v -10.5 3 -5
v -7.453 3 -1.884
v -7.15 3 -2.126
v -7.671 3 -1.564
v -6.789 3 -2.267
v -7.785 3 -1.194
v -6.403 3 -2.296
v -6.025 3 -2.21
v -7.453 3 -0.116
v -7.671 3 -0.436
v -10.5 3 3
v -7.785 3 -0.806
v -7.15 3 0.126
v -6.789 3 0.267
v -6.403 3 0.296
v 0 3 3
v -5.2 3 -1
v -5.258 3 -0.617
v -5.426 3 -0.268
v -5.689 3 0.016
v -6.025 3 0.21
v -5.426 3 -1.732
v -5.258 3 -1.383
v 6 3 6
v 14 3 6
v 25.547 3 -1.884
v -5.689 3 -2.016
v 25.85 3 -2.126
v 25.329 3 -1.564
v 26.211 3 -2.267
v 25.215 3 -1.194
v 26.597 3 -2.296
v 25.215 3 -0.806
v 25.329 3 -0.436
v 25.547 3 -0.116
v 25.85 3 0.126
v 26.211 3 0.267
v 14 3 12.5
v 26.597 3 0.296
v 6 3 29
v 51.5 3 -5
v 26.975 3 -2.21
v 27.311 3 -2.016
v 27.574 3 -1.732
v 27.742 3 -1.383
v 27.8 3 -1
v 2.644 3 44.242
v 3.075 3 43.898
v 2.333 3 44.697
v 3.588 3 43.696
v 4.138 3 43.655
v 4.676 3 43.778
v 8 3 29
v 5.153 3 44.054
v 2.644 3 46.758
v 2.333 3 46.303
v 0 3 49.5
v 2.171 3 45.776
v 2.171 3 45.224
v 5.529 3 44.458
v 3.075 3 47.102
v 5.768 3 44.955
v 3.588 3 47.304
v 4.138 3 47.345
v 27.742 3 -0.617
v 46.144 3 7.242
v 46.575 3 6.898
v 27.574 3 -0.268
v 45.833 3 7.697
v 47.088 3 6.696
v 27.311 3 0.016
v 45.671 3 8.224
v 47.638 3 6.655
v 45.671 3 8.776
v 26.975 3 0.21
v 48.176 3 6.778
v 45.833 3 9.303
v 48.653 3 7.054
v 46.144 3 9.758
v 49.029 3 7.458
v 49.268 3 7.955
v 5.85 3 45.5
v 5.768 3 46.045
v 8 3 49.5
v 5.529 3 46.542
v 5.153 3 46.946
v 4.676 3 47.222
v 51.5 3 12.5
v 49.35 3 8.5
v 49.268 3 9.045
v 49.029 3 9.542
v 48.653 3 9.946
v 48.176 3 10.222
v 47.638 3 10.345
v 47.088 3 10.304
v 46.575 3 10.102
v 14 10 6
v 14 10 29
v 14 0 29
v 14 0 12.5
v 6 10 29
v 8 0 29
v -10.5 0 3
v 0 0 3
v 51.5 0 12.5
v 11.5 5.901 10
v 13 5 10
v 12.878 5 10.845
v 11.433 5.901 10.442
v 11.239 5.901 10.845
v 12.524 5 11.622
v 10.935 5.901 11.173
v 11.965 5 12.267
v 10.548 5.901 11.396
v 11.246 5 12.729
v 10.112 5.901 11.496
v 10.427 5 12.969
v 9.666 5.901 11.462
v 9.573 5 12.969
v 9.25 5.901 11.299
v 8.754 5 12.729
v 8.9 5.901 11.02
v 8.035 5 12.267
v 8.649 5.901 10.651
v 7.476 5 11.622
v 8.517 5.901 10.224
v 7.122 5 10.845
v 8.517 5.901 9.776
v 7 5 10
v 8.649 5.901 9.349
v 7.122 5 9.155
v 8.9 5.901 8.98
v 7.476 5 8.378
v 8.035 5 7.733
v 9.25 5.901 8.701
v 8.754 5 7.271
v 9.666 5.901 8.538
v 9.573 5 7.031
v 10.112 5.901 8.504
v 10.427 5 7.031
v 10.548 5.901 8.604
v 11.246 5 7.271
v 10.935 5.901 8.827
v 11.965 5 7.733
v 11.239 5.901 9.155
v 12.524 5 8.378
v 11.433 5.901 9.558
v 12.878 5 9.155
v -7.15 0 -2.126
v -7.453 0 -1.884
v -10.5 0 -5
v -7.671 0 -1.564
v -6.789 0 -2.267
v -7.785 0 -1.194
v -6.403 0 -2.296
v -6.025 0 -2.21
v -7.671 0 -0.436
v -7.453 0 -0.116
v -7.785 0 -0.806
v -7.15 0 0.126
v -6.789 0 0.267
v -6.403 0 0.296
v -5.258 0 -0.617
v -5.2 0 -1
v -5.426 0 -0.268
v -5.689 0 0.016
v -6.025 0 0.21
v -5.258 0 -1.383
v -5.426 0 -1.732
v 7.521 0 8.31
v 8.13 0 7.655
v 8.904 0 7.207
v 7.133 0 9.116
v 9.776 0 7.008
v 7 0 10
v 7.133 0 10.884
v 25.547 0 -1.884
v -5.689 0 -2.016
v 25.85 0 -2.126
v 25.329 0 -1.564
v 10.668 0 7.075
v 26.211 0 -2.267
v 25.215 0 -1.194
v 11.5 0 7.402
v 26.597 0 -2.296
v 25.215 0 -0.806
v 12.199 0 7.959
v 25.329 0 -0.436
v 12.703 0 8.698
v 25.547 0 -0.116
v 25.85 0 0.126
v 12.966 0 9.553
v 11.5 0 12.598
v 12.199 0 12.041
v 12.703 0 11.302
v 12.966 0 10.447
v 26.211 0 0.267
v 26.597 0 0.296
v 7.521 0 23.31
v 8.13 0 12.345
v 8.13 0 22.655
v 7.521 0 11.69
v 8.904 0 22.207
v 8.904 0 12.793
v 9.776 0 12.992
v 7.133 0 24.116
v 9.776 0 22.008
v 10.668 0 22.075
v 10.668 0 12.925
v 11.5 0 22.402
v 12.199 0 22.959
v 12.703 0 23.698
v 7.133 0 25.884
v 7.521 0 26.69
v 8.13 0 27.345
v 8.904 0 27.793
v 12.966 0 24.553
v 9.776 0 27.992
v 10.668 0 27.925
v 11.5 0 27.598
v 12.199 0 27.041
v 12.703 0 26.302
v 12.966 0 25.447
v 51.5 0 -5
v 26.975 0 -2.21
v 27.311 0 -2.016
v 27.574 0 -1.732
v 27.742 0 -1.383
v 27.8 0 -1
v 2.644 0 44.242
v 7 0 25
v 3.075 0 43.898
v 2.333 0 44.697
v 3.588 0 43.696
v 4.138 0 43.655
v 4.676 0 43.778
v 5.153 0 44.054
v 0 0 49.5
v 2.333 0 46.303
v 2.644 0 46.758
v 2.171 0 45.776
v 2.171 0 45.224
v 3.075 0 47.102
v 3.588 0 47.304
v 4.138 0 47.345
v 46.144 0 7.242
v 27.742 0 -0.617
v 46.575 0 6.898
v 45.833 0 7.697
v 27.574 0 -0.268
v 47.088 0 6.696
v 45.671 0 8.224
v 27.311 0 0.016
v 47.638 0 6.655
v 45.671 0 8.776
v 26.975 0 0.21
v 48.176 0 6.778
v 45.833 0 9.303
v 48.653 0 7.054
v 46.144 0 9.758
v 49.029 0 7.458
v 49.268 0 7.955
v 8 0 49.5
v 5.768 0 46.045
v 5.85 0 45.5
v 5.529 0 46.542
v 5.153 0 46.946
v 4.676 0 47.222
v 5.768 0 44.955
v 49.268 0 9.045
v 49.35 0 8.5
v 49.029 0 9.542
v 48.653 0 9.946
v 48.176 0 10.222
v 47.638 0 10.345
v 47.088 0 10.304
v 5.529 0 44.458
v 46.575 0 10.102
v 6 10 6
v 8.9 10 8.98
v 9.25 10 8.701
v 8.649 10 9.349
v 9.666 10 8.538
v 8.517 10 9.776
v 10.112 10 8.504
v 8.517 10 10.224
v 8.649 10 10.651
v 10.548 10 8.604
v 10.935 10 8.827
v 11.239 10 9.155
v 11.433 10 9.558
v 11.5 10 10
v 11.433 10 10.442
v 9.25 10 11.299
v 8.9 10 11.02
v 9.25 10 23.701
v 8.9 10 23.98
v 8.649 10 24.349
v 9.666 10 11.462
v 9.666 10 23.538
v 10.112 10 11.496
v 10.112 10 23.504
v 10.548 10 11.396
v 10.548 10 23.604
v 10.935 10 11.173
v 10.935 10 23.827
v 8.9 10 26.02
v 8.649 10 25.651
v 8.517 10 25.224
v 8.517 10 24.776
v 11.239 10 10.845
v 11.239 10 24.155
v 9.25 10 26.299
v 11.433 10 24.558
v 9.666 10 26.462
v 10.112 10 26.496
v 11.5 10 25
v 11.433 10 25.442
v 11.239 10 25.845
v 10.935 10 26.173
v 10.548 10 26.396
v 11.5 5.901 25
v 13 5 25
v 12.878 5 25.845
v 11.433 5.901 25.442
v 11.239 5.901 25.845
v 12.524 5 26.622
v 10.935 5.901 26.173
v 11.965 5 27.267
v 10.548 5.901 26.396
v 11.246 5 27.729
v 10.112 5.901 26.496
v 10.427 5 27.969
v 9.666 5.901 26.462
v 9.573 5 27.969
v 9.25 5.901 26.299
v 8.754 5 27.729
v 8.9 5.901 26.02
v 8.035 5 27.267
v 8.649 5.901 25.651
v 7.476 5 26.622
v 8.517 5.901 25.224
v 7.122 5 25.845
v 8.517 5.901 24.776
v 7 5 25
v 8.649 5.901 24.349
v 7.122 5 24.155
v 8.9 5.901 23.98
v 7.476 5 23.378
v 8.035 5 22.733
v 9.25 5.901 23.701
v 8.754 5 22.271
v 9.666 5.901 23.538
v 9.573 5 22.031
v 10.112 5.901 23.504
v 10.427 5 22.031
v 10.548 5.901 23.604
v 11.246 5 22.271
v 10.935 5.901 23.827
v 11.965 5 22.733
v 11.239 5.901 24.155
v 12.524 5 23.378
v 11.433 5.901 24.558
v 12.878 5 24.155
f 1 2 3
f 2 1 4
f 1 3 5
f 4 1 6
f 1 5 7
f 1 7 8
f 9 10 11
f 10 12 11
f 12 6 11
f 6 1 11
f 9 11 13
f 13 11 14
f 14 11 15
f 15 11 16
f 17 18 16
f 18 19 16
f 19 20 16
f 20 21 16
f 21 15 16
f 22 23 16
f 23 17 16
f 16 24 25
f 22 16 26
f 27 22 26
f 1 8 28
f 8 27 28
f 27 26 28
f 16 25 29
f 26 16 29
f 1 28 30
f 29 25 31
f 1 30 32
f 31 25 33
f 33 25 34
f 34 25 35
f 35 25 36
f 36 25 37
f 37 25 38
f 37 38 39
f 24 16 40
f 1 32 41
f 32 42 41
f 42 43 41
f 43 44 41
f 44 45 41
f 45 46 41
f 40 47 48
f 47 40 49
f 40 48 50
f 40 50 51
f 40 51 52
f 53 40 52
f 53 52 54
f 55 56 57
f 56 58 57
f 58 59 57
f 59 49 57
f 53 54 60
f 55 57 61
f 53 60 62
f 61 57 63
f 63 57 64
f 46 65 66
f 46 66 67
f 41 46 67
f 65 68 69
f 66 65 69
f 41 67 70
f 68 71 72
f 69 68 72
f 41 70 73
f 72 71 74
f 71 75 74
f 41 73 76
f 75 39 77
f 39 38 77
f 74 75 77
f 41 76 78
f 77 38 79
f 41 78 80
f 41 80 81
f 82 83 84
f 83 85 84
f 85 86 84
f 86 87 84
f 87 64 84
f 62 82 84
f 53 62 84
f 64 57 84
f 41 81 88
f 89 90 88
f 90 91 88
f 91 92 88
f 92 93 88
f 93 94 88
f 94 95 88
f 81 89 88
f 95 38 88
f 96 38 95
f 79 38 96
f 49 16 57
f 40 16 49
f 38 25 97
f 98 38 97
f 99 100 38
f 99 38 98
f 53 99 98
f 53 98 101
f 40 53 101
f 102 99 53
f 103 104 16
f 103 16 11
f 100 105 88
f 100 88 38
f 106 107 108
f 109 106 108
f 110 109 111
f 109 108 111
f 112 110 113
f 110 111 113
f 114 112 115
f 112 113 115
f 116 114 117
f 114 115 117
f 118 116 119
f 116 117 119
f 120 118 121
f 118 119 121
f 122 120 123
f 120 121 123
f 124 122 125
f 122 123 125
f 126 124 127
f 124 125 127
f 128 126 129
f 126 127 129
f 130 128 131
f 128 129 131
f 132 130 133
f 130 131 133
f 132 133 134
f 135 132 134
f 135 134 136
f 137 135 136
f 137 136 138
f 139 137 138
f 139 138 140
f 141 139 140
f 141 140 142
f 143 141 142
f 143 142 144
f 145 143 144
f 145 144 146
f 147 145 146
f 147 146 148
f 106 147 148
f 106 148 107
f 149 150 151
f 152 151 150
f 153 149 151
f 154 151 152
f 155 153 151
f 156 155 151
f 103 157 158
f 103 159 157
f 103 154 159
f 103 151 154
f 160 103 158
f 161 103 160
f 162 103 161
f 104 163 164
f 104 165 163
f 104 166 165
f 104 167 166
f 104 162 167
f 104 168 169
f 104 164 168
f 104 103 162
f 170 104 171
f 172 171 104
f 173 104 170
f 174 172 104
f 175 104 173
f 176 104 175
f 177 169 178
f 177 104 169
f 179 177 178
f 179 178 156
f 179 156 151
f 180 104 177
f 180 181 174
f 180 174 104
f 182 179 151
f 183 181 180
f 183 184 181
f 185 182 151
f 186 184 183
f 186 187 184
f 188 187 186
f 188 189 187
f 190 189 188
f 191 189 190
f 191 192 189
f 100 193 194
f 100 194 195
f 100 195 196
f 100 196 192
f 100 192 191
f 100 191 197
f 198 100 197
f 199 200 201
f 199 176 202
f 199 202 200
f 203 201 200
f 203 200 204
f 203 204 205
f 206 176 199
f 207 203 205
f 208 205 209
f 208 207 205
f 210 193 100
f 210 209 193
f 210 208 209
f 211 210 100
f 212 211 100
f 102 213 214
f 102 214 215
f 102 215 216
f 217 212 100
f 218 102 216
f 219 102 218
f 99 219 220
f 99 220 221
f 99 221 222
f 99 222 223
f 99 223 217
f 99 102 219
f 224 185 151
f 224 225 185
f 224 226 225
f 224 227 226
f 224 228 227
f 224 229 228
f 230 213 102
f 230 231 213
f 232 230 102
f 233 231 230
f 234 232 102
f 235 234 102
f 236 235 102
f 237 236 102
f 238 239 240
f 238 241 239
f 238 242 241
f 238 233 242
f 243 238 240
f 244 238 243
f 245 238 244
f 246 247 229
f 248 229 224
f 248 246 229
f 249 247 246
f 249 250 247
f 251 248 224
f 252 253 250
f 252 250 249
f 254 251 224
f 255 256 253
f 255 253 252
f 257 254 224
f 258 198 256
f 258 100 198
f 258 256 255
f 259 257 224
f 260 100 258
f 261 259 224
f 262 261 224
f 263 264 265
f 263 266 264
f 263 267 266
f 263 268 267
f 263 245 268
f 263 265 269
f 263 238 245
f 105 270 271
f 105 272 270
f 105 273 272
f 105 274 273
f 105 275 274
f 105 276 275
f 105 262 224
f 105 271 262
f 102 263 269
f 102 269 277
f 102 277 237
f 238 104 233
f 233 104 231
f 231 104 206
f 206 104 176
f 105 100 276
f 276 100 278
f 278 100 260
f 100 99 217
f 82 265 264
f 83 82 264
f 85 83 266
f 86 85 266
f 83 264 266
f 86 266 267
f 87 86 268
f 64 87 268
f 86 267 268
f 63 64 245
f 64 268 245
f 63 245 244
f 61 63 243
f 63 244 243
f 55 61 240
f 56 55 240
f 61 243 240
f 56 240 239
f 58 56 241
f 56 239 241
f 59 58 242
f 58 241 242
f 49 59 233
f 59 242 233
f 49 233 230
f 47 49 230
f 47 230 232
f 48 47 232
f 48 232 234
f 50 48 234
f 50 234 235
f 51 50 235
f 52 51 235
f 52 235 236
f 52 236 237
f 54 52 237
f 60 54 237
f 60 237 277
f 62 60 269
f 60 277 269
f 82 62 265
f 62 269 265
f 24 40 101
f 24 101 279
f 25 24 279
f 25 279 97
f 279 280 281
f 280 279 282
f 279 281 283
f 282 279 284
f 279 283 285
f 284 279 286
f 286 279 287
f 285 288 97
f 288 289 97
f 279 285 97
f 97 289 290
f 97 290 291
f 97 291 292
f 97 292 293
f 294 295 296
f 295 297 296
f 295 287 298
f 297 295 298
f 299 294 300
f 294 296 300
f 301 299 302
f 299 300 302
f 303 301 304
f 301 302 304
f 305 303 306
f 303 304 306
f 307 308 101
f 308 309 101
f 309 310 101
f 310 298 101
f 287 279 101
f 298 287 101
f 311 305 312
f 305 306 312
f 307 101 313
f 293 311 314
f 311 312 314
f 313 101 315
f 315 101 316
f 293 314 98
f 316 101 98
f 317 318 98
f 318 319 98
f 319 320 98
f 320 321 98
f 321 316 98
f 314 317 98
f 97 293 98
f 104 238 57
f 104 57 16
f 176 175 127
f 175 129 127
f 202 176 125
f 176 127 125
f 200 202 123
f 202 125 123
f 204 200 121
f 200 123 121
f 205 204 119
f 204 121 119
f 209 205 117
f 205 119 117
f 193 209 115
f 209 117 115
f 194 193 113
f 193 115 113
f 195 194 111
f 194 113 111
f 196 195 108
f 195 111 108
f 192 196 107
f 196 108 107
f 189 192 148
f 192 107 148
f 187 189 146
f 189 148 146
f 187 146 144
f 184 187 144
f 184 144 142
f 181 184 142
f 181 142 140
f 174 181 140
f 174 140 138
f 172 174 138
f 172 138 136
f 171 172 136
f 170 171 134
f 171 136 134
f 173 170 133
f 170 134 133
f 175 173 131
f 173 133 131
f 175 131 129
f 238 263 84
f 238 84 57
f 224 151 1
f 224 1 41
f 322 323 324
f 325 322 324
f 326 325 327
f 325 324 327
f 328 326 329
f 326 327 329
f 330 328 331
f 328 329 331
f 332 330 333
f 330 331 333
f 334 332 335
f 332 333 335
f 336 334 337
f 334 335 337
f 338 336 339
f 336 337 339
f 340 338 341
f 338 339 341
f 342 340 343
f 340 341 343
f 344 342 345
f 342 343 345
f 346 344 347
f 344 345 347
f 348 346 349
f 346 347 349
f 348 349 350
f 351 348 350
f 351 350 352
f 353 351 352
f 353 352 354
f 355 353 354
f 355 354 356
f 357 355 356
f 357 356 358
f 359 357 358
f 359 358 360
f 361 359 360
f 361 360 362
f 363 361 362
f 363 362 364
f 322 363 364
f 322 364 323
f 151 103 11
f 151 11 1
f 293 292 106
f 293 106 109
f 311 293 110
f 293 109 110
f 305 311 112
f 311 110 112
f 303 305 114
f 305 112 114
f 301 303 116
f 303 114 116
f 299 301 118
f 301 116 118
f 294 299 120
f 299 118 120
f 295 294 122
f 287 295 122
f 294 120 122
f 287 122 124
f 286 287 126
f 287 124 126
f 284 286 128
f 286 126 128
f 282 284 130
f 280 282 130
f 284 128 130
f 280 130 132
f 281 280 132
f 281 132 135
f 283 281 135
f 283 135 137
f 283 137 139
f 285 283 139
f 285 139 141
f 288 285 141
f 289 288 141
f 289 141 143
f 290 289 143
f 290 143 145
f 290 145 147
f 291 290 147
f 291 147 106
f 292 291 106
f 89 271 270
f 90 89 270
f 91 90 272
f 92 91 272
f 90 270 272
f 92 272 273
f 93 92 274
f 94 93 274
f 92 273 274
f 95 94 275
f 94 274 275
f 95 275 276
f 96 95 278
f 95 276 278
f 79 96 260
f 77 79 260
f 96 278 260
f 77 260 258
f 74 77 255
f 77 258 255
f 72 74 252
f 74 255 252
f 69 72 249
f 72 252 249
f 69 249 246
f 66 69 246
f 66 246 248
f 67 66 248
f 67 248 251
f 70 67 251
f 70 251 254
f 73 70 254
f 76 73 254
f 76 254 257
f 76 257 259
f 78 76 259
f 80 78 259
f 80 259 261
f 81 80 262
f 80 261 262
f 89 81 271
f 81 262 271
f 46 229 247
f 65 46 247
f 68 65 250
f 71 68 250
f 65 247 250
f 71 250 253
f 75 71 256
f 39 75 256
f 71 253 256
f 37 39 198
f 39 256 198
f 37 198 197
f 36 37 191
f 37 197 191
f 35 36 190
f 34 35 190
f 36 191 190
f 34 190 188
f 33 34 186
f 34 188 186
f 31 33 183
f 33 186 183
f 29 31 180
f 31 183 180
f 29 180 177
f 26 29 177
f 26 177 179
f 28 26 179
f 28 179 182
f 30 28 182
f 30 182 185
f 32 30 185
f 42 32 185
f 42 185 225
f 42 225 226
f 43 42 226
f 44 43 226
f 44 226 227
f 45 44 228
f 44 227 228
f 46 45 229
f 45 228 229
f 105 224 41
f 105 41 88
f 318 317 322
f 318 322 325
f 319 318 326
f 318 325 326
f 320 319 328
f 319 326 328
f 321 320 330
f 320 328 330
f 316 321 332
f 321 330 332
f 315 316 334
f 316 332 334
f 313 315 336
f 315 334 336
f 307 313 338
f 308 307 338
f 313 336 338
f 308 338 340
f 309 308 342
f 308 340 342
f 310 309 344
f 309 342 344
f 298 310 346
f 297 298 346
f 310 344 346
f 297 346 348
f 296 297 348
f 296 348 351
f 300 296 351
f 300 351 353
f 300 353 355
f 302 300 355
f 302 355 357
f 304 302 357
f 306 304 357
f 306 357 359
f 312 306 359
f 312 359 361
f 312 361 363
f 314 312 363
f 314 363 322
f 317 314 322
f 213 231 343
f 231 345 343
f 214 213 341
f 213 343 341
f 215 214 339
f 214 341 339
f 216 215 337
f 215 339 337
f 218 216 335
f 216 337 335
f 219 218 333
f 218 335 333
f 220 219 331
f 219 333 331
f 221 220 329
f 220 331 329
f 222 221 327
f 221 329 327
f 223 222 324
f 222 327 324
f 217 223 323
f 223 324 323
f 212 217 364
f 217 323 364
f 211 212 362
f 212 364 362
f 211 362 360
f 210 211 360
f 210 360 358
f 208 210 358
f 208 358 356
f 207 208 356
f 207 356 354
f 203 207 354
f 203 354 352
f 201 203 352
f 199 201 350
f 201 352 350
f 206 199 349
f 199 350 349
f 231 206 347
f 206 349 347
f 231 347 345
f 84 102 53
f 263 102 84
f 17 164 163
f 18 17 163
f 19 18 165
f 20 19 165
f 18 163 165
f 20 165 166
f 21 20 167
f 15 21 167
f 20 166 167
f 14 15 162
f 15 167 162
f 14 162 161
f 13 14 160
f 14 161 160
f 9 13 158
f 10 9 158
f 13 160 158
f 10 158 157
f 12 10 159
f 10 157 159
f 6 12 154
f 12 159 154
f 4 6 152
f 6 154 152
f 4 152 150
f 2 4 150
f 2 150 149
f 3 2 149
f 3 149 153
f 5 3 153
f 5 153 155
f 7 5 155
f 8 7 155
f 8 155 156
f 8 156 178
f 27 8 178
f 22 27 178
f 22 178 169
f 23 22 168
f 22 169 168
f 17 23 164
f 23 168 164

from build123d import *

# Parameters (mm, degrees)
F0_R     = 1.3
F0_R_2   = 1.85
F0_R_3   = 1.5
F1_DEPTH = 3
F2_DEPTH = 10
F3_D     = 6
F3_DEPTH = 5
F3_TIP   = 1.8025818571


with BuildPart() as f1:
    # F0 (on Front) → F1 (new body)
    with BuildSketch(Plane.XZ):
        Polygon((-10.5, -5), (51.5, -5), (51.5, 12.5), (14, 12.5), (14, 6), (6, 6), (6, 29), (8, 29), (8, 49.5), (0, 49.5), (0, 3), (-10.5, 3), align=None)
        with Locations((-6.5, -1)):
            Circle(F0_R, mode=Mode.SUBTRACT)
        with Locations((26.5, -1)):
            Circle(F0_R, mode=Mode.SUBTRACT)
        with Locations((47.5, 8.5)):
            Circle(F0_R_2, mode=Mode.SUBTRACT)
        with Locations((4, 45.5)):
            Circle(F0_R_2, mode=Mode.SUBTRACT)
        Polygon((14, 6), (14, 12.5), (14, 29), (8, 29), (6, 29), (6, 6), align=None)
        with Locations((10, 10)):
            Circle(F0_R_3, mode=Mode.SUBTRACT)
        with Locations((10, 25)):
            Circle(F0_R_3, mode=Mode.SUBTRACT)
    extrude(amount=-F1_DEPTH)

    # F0 (on Front) → F2 (join)
    with BuildSketch(Plane.XZ):
        Polygon((14, 6), (14, 12.5), (14, 29), (8, 29), (6, 29), (6, 6), align=None)
        with Locations((10, 10)):
            Circle(F0_R_3, mode=Mode.SUBTRACT)
        with Locations((10, 25)):
            Circle(F0_R_3, mode=Mode.SUBTRACT)
    extrude(amount=-F2_DEPTH)

    # F3
    with Locations(Plane.XZ):
        with Locations((10, 25), (10, 10)):
            Hole(F3_D / 2, depth=F3_DEPTH)
            with Locations((0, 0, -(F3_DEPTH + F3_TIP / 2))):  # 118° drill point
                Cone(0, F3_D / 2, F3_TIP, mode=Mode.SUBTRACT)


solid = f1.part
